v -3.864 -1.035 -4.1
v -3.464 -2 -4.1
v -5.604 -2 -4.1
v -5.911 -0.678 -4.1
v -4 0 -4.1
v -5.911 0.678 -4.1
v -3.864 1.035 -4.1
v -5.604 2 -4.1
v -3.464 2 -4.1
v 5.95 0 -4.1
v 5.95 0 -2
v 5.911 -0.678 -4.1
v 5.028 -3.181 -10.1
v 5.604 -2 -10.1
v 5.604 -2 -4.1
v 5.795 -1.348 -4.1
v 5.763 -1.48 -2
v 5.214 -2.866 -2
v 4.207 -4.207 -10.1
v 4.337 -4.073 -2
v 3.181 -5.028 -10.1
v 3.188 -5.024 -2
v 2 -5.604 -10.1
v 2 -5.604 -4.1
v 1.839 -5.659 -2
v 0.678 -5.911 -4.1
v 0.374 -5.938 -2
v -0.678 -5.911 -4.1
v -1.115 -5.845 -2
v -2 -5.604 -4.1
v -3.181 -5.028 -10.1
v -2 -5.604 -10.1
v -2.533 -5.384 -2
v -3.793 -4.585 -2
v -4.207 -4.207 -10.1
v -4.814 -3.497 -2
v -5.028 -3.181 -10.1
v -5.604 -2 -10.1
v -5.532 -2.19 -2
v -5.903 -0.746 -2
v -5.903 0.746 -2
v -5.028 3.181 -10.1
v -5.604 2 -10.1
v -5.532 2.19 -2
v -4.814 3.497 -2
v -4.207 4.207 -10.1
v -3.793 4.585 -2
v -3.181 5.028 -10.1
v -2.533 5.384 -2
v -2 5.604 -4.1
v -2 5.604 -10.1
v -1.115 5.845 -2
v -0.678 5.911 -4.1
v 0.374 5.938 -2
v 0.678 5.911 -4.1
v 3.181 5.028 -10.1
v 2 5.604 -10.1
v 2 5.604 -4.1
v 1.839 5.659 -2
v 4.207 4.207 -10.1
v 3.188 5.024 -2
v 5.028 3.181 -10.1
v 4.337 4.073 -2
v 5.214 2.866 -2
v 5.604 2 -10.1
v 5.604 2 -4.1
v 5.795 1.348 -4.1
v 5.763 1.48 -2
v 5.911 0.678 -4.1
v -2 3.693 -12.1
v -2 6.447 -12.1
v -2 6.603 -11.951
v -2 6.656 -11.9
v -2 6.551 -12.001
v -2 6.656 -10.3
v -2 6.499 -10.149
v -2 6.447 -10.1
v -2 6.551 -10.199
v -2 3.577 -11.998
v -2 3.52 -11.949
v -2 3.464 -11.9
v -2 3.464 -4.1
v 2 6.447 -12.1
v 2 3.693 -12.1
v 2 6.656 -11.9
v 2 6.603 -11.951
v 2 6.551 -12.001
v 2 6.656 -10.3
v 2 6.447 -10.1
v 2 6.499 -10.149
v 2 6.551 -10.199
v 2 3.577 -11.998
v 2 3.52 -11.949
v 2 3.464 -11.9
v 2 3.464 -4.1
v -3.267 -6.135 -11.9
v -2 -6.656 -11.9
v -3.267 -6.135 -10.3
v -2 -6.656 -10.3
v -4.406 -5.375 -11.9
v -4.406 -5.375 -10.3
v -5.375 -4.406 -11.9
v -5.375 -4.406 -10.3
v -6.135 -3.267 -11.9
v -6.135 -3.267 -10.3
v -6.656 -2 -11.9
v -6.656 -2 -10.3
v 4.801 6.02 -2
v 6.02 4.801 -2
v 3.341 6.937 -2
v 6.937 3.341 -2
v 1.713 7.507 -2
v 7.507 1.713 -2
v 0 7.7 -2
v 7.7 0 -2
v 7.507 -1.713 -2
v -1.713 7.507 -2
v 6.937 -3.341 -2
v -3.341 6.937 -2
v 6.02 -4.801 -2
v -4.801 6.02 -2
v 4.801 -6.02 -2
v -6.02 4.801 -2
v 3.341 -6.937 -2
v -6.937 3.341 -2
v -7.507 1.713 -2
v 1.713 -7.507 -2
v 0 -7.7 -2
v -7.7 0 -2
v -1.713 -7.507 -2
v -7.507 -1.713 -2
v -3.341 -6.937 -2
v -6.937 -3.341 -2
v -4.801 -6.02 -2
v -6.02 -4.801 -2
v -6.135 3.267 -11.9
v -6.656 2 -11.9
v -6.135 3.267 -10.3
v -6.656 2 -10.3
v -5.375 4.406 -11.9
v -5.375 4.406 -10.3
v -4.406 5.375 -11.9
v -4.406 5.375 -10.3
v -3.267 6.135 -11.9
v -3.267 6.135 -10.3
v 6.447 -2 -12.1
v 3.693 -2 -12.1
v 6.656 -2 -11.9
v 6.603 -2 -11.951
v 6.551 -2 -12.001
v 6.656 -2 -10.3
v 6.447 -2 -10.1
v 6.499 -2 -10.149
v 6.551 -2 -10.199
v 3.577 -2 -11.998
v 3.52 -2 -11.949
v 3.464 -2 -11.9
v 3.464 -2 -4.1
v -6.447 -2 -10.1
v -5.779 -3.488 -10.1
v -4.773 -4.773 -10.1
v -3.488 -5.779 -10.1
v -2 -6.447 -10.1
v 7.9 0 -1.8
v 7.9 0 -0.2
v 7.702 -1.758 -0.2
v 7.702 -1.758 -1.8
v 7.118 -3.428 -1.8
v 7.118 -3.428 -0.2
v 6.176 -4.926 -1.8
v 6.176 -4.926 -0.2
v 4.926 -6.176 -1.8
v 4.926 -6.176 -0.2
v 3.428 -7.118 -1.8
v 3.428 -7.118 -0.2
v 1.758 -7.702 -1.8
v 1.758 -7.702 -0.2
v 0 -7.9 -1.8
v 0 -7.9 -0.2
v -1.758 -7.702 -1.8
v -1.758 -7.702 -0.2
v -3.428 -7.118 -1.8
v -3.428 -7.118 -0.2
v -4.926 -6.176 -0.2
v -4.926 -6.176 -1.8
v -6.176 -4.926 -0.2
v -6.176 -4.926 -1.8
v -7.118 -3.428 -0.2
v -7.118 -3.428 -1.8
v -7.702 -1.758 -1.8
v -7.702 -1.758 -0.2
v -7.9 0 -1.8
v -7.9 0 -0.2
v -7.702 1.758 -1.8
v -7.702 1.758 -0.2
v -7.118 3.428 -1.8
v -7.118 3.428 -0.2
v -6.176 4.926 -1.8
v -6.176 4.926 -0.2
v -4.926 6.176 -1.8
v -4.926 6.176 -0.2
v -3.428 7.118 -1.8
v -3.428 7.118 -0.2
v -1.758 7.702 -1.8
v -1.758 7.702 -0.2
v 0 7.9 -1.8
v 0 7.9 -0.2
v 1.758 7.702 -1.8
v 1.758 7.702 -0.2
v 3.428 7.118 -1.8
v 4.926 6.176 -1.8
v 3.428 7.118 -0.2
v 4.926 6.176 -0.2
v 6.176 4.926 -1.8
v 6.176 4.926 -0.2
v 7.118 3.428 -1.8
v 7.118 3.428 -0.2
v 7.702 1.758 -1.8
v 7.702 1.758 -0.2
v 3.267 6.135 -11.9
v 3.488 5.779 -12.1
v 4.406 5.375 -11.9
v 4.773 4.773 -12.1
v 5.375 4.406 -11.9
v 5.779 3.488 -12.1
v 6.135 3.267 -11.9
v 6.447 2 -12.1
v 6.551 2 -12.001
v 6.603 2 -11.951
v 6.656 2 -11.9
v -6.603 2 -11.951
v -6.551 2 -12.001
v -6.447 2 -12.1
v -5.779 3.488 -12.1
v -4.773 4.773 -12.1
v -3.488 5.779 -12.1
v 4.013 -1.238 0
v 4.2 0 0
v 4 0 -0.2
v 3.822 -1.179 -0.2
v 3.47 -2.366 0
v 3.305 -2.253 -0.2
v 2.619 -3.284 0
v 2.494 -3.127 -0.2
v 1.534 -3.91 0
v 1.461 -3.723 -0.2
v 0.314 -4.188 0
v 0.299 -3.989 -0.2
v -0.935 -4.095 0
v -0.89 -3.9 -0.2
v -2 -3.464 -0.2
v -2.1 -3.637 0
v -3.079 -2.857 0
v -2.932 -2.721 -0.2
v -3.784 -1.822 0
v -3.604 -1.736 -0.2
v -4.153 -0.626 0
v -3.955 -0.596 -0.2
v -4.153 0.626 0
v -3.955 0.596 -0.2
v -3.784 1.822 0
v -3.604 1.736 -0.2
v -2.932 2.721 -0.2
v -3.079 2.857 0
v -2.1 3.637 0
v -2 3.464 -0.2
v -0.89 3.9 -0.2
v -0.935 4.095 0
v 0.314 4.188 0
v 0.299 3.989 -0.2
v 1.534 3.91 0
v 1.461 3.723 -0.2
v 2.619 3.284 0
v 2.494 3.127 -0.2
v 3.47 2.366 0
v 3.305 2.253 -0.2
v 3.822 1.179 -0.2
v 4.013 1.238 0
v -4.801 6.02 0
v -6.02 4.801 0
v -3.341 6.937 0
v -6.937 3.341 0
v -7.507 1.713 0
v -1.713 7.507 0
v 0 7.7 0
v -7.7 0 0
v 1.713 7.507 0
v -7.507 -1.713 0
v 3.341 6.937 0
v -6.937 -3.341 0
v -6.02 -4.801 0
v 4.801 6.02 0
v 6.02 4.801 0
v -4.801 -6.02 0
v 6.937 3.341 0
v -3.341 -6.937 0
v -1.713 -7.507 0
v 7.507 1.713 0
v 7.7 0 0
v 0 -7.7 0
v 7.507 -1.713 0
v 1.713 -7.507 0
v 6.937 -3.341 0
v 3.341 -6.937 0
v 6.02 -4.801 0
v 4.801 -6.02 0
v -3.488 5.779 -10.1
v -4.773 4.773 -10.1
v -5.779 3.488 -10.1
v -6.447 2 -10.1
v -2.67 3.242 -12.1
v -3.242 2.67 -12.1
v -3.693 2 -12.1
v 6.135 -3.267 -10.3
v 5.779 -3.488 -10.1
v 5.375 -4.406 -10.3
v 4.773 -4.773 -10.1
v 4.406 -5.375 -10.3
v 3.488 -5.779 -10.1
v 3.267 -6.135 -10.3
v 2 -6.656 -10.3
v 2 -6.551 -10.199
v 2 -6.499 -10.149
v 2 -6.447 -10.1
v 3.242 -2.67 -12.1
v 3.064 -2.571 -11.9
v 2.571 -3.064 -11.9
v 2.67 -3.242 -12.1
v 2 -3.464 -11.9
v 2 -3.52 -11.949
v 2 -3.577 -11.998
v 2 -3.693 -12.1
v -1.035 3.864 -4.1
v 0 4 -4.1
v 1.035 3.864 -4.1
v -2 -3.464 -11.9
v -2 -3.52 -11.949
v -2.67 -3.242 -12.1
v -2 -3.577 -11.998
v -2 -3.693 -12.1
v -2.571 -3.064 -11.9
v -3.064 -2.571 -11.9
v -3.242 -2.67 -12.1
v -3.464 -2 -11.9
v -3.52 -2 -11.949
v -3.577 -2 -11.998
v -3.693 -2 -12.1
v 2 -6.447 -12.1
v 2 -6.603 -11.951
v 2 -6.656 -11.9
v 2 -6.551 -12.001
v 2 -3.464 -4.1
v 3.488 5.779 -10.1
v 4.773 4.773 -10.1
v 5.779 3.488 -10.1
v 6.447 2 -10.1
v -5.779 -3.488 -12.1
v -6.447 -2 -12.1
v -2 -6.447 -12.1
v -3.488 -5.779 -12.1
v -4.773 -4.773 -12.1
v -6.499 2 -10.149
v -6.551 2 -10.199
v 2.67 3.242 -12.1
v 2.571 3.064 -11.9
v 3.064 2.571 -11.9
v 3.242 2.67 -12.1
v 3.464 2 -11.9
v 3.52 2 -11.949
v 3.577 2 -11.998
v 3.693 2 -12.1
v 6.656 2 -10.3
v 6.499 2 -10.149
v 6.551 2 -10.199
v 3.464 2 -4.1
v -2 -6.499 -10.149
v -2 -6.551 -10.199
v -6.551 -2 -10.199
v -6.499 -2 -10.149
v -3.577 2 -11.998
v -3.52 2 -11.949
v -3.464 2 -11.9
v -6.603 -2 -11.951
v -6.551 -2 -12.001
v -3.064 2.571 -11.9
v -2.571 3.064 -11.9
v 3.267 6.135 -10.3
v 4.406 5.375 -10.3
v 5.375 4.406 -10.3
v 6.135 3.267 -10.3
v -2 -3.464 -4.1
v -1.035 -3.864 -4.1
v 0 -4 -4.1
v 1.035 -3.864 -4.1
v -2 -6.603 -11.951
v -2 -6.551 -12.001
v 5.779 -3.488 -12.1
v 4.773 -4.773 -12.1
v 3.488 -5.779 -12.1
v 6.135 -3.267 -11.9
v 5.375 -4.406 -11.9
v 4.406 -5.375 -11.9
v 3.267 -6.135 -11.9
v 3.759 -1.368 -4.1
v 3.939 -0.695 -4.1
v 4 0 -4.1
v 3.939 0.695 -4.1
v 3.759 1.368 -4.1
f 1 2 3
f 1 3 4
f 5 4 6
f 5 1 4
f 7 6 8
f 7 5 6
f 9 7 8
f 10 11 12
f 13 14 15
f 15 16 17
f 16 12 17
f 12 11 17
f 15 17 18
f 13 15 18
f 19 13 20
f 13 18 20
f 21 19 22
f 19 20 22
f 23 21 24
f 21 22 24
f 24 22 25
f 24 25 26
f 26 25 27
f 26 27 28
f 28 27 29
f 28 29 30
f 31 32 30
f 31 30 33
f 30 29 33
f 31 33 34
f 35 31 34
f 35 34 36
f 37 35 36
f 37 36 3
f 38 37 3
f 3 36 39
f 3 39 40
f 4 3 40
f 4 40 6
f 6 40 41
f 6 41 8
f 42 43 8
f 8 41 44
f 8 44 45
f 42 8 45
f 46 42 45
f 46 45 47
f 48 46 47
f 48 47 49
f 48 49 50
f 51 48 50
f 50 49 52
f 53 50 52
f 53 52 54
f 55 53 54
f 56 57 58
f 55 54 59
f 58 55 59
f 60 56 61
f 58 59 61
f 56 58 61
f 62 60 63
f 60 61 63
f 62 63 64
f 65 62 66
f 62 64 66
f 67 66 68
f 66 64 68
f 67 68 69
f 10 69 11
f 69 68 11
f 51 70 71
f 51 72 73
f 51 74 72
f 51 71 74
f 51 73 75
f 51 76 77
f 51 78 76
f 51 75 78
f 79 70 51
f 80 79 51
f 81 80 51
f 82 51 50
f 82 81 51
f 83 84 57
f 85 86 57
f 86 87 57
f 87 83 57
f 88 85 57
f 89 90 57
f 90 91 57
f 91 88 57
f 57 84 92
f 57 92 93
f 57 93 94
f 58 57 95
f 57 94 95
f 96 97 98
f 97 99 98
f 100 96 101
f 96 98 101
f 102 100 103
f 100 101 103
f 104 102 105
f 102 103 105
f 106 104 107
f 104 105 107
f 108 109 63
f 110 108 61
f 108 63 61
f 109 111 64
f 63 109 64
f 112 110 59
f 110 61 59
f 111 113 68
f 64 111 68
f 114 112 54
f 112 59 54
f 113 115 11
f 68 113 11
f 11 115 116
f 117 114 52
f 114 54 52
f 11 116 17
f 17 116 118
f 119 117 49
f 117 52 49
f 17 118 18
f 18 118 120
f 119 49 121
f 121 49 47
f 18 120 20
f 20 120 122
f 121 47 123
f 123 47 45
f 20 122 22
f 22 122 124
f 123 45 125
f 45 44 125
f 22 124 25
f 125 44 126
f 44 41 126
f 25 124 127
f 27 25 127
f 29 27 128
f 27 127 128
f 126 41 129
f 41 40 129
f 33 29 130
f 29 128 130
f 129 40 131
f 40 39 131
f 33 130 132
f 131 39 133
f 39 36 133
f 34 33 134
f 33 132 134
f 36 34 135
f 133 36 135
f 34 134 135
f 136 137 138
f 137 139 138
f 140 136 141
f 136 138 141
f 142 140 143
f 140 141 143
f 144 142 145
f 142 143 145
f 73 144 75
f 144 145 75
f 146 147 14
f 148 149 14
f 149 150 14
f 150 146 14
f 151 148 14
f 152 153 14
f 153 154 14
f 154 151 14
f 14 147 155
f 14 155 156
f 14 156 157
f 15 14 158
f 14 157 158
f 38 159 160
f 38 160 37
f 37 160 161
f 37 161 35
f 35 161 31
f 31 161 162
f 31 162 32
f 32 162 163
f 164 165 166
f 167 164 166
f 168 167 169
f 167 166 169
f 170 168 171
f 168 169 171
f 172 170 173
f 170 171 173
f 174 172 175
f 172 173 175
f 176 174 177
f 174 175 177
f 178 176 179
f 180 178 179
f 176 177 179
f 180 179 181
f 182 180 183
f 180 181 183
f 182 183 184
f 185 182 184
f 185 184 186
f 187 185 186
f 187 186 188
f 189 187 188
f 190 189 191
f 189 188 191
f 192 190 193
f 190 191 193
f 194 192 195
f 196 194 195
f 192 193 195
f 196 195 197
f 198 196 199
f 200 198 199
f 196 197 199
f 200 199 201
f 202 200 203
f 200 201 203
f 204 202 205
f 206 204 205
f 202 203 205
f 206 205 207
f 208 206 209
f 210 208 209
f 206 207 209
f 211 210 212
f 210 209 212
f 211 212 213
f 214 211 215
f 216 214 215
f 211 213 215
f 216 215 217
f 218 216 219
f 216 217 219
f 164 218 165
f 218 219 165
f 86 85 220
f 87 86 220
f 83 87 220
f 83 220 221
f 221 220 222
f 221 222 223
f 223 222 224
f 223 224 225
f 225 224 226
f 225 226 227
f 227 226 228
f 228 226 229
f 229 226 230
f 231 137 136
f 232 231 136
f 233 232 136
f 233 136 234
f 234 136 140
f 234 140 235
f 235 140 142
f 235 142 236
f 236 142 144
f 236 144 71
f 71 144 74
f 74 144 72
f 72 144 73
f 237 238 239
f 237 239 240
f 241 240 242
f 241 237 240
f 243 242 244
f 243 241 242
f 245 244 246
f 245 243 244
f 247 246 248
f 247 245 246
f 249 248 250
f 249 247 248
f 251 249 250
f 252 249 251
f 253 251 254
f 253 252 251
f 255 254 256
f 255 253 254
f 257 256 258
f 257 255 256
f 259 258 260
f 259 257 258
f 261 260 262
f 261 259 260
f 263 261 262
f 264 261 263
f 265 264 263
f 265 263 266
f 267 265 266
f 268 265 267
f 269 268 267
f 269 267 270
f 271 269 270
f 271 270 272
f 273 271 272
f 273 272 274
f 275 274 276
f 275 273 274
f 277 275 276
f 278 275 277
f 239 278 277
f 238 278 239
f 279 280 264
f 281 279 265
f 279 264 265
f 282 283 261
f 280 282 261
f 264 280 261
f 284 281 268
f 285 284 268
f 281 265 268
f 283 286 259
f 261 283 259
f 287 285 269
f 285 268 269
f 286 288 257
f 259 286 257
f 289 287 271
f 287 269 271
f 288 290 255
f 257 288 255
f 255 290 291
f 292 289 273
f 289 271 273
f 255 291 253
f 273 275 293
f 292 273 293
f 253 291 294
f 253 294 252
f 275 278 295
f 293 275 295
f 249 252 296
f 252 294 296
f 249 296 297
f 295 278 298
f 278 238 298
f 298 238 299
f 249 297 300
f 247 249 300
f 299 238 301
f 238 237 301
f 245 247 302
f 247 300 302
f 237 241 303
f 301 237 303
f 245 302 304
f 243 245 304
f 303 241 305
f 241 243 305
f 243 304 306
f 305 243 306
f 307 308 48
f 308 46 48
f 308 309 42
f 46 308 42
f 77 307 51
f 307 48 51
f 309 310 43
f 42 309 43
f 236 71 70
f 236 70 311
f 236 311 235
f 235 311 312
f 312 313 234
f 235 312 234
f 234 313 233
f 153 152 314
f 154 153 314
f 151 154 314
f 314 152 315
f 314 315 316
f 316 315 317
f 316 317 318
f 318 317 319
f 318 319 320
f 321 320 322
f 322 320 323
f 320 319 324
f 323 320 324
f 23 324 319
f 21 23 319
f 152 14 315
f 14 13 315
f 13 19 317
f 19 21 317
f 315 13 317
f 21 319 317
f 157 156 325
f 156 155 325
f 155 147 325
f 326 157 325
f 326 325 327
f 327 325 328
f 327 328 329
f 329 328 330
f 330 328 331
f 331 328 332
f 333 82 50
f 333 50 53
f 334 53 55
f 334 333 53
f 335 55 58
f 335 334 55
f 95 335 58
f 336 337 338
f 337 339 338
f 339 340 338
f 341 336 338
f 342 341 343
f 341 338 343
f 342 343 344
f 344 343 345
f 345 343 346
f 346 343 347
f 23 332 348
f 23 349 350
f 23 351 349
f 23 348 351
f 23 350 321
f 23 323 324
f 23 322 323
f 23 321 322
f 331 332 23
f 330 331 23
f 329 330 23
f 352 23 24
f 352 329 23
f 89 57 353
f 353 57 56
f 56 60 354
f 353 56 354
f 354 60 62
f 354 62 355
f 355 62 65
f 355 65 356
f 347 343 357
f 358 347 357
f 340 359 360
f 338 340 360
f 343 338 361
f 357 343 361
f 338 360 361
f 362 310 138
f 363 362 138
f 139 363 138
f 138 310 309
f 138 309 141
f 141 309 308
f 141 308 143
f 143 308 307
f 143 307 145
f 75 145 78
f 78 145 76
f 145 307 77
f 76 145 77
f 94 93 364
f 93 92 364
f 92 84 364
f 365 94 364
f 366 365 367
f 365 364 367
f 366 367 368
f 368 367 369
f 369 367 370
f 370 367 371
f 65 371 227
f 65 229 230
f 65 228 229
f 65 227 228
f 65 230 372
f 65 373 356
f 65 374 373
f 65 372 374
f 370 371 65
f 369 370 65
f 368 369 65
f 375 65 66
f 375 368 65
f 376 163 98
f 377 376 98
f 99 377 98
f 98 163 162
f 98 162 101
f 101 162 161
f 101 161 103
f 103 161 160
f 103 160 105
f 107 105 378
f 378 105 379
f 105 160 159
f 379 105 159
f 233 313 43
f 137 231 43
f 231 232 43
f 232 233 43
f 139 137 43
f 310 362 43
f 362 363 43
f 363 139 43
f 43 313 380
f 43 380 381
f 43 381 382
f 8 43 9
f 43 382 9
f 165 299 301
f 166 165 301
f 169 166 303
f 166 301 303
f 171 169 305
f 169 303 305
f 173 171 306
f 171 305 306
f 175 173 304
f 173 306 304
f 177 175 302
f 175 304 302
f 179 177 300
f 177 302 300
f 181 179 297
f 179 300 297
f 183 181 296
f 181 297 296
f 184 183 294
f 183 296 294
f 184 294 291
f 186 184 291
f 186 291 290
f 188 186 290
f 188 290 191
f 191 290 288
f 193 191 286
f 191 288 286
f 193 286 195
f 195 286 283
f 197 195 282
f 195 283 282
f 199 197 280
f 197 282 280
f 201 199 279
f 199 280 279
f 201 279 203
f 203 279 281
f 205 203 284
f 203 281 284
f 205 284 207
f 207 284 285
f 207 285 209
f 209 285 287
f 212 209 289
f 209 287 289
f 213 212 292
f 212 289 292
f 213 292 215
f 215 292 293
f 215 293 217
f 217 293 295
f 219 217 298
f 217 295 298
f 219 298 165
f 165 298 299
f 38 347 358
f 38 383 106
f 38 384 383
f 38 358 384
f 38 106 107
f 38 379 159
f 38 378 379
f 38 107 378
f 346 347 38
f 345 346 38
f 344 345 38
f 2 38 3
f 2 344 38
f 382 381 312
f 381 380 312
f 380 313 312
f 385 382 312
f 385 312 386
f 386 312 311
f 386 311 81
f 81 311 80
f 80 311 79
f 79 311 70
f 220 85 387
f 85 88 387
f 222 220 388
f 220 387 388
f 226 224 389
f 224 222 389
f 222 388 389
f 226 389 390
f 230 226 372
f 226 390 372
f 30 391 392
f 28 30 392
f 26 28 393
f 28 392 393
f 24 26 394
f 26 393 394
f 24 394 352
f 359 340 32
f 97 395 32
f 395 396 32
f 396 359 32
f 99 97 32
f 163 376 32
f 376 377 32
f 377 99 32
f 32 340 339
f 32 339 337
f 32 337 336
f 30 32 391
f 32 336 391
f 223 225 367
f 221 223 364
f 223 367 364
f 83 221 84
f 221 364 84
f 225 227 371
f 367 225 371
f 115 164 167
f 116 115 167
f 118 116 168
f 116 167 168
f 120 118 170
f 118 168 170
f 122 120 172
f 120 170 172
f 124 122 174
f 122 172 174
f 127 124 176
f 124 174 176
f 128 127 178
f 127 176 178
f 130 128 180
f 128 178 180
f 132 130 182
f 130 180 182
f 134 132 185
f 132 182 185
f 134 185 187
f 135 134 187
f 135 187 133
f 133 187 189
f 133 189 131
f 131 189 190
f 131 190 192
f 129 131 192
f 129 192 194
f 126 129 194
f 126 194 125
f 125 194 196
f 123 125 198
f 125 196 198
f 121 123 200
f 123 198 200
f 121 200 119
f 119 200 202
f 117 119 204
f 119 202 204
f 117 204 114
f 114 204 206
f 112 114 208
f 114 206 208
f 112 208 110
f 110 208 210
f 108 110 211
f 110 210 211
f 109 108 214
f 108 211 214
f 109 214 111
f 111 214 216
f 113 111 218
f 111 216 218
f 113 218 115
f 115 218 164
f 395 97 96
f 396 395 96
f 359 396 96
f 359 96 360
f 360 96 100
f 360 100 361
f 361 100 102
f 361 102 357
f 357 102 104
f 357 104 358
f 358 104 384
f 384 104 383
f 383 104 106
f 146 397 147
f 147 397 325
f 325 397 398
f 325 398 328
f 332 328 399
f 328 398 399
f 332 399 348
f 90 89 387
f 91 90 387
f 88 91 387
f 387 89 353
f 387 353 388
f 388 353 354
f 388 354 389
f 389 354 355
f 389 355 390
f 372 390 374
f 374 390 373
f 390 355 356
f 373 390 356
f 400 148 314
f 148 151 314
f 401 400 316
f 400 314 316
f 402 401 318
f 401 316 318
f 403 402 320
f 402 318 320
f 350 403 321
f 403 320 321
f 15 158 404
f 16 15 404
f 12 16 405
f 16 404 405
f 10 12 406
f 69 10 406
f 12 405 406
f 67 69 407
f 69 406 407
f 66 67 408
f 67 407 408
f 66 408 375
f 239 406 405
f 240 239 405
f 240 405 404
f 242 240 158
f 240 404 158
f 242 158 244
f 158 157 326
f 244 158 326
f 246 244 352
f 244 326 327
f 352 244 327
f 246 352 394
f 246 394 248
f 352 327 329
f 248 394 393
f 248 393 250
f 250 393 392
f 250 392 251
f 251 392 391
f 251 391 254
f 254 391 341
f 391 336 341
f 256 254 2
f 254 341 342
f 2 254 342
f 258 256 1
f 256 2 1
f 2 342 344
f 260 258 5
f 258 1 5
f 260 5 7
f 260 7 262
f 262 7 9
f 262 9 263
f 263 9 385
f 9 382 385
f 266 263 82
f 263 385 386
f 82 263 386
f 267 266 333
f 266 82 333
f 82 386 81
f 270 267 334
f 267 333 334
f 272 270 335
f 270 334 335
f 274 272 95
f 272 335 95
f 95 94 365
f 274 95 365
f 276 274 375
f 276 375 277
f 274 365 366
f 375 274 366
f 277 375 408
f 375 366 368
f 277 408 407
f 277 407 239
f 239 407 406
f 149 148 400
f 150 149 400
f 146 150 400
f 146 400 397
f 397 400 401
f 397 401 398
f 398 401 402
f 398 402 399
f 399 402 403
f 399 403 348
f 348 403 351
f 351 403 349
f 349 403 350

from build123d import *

# Parameters (mm, degrees)
F2_SIZE       = 0.2
F3_W          = 4
F3_H          = 8
F4_DEPTH      = 7.901
F4_DEPTH_BACK = 7.901
F5_W          = 4
F5_H          = 8
F6_DEPTH      = 7.901
F6_DEPTH_BACK = 7.901


with BuildPart() as f1:
    # F0 (on Front) → F1 (revolve)
    with BuildSketch(Plane.XZ):
        Polygon((4, 0), (4, -12.1), (6.95, -12.1), (6.95, -10.1), (5.95, -10.1), (5.95, -2), (7.9, -2), (7.9, 0), align=None)
    revolve(axis=Axis((0, 0, -6.05), (0, 0, -1)))

    # F2
    f2_edges = [f1.edges().sort_by_distance(p)[0] for p in [
        (-4, 0, 0),
        (-4, 0, -12.1),
        (4, 0, -6.05),
        (-7.9, 0, -2),
        (-7.9, 0, 0),
        (7.9, 0, -1),
        (-6.95, 0, -12.1),
        (-6.95, 0, -10.1),
        (6.95, 0, -11.1),
    ]]
    chamfer(f2_edges, length=F2_SIZE)

    # F3 (on Front) → F4 (cut, two sides)
    with BuildSketch(Plane.XZ) as f4_sk:
        with Locations((0, -8.1)):
            Rectangle(F3_W, F3_H)
    extrude(amount=-F4_DEPTH, mode=Mode.SUBTRACT)
    extrude(f4_sk.sketch, amount=F4_DEPTH_BACK, mode=Mode.SUBTRACT)

    # F5 (on Right) → F6 (cut, two sides)
    with BuildSketch(Plane.YZ) as f6_sk:
        with Locations((0, -8.1)):
            Rectangle(F5_W, F5_H)
    extrude(amount=F6_DEPTH, mode=Mode.SUBTRACT)
    extrude(f6_sk.sketch, amount=-F6_DEPTH_BACK, mode=Mode.SUBTRACT)


solid = f1.part
